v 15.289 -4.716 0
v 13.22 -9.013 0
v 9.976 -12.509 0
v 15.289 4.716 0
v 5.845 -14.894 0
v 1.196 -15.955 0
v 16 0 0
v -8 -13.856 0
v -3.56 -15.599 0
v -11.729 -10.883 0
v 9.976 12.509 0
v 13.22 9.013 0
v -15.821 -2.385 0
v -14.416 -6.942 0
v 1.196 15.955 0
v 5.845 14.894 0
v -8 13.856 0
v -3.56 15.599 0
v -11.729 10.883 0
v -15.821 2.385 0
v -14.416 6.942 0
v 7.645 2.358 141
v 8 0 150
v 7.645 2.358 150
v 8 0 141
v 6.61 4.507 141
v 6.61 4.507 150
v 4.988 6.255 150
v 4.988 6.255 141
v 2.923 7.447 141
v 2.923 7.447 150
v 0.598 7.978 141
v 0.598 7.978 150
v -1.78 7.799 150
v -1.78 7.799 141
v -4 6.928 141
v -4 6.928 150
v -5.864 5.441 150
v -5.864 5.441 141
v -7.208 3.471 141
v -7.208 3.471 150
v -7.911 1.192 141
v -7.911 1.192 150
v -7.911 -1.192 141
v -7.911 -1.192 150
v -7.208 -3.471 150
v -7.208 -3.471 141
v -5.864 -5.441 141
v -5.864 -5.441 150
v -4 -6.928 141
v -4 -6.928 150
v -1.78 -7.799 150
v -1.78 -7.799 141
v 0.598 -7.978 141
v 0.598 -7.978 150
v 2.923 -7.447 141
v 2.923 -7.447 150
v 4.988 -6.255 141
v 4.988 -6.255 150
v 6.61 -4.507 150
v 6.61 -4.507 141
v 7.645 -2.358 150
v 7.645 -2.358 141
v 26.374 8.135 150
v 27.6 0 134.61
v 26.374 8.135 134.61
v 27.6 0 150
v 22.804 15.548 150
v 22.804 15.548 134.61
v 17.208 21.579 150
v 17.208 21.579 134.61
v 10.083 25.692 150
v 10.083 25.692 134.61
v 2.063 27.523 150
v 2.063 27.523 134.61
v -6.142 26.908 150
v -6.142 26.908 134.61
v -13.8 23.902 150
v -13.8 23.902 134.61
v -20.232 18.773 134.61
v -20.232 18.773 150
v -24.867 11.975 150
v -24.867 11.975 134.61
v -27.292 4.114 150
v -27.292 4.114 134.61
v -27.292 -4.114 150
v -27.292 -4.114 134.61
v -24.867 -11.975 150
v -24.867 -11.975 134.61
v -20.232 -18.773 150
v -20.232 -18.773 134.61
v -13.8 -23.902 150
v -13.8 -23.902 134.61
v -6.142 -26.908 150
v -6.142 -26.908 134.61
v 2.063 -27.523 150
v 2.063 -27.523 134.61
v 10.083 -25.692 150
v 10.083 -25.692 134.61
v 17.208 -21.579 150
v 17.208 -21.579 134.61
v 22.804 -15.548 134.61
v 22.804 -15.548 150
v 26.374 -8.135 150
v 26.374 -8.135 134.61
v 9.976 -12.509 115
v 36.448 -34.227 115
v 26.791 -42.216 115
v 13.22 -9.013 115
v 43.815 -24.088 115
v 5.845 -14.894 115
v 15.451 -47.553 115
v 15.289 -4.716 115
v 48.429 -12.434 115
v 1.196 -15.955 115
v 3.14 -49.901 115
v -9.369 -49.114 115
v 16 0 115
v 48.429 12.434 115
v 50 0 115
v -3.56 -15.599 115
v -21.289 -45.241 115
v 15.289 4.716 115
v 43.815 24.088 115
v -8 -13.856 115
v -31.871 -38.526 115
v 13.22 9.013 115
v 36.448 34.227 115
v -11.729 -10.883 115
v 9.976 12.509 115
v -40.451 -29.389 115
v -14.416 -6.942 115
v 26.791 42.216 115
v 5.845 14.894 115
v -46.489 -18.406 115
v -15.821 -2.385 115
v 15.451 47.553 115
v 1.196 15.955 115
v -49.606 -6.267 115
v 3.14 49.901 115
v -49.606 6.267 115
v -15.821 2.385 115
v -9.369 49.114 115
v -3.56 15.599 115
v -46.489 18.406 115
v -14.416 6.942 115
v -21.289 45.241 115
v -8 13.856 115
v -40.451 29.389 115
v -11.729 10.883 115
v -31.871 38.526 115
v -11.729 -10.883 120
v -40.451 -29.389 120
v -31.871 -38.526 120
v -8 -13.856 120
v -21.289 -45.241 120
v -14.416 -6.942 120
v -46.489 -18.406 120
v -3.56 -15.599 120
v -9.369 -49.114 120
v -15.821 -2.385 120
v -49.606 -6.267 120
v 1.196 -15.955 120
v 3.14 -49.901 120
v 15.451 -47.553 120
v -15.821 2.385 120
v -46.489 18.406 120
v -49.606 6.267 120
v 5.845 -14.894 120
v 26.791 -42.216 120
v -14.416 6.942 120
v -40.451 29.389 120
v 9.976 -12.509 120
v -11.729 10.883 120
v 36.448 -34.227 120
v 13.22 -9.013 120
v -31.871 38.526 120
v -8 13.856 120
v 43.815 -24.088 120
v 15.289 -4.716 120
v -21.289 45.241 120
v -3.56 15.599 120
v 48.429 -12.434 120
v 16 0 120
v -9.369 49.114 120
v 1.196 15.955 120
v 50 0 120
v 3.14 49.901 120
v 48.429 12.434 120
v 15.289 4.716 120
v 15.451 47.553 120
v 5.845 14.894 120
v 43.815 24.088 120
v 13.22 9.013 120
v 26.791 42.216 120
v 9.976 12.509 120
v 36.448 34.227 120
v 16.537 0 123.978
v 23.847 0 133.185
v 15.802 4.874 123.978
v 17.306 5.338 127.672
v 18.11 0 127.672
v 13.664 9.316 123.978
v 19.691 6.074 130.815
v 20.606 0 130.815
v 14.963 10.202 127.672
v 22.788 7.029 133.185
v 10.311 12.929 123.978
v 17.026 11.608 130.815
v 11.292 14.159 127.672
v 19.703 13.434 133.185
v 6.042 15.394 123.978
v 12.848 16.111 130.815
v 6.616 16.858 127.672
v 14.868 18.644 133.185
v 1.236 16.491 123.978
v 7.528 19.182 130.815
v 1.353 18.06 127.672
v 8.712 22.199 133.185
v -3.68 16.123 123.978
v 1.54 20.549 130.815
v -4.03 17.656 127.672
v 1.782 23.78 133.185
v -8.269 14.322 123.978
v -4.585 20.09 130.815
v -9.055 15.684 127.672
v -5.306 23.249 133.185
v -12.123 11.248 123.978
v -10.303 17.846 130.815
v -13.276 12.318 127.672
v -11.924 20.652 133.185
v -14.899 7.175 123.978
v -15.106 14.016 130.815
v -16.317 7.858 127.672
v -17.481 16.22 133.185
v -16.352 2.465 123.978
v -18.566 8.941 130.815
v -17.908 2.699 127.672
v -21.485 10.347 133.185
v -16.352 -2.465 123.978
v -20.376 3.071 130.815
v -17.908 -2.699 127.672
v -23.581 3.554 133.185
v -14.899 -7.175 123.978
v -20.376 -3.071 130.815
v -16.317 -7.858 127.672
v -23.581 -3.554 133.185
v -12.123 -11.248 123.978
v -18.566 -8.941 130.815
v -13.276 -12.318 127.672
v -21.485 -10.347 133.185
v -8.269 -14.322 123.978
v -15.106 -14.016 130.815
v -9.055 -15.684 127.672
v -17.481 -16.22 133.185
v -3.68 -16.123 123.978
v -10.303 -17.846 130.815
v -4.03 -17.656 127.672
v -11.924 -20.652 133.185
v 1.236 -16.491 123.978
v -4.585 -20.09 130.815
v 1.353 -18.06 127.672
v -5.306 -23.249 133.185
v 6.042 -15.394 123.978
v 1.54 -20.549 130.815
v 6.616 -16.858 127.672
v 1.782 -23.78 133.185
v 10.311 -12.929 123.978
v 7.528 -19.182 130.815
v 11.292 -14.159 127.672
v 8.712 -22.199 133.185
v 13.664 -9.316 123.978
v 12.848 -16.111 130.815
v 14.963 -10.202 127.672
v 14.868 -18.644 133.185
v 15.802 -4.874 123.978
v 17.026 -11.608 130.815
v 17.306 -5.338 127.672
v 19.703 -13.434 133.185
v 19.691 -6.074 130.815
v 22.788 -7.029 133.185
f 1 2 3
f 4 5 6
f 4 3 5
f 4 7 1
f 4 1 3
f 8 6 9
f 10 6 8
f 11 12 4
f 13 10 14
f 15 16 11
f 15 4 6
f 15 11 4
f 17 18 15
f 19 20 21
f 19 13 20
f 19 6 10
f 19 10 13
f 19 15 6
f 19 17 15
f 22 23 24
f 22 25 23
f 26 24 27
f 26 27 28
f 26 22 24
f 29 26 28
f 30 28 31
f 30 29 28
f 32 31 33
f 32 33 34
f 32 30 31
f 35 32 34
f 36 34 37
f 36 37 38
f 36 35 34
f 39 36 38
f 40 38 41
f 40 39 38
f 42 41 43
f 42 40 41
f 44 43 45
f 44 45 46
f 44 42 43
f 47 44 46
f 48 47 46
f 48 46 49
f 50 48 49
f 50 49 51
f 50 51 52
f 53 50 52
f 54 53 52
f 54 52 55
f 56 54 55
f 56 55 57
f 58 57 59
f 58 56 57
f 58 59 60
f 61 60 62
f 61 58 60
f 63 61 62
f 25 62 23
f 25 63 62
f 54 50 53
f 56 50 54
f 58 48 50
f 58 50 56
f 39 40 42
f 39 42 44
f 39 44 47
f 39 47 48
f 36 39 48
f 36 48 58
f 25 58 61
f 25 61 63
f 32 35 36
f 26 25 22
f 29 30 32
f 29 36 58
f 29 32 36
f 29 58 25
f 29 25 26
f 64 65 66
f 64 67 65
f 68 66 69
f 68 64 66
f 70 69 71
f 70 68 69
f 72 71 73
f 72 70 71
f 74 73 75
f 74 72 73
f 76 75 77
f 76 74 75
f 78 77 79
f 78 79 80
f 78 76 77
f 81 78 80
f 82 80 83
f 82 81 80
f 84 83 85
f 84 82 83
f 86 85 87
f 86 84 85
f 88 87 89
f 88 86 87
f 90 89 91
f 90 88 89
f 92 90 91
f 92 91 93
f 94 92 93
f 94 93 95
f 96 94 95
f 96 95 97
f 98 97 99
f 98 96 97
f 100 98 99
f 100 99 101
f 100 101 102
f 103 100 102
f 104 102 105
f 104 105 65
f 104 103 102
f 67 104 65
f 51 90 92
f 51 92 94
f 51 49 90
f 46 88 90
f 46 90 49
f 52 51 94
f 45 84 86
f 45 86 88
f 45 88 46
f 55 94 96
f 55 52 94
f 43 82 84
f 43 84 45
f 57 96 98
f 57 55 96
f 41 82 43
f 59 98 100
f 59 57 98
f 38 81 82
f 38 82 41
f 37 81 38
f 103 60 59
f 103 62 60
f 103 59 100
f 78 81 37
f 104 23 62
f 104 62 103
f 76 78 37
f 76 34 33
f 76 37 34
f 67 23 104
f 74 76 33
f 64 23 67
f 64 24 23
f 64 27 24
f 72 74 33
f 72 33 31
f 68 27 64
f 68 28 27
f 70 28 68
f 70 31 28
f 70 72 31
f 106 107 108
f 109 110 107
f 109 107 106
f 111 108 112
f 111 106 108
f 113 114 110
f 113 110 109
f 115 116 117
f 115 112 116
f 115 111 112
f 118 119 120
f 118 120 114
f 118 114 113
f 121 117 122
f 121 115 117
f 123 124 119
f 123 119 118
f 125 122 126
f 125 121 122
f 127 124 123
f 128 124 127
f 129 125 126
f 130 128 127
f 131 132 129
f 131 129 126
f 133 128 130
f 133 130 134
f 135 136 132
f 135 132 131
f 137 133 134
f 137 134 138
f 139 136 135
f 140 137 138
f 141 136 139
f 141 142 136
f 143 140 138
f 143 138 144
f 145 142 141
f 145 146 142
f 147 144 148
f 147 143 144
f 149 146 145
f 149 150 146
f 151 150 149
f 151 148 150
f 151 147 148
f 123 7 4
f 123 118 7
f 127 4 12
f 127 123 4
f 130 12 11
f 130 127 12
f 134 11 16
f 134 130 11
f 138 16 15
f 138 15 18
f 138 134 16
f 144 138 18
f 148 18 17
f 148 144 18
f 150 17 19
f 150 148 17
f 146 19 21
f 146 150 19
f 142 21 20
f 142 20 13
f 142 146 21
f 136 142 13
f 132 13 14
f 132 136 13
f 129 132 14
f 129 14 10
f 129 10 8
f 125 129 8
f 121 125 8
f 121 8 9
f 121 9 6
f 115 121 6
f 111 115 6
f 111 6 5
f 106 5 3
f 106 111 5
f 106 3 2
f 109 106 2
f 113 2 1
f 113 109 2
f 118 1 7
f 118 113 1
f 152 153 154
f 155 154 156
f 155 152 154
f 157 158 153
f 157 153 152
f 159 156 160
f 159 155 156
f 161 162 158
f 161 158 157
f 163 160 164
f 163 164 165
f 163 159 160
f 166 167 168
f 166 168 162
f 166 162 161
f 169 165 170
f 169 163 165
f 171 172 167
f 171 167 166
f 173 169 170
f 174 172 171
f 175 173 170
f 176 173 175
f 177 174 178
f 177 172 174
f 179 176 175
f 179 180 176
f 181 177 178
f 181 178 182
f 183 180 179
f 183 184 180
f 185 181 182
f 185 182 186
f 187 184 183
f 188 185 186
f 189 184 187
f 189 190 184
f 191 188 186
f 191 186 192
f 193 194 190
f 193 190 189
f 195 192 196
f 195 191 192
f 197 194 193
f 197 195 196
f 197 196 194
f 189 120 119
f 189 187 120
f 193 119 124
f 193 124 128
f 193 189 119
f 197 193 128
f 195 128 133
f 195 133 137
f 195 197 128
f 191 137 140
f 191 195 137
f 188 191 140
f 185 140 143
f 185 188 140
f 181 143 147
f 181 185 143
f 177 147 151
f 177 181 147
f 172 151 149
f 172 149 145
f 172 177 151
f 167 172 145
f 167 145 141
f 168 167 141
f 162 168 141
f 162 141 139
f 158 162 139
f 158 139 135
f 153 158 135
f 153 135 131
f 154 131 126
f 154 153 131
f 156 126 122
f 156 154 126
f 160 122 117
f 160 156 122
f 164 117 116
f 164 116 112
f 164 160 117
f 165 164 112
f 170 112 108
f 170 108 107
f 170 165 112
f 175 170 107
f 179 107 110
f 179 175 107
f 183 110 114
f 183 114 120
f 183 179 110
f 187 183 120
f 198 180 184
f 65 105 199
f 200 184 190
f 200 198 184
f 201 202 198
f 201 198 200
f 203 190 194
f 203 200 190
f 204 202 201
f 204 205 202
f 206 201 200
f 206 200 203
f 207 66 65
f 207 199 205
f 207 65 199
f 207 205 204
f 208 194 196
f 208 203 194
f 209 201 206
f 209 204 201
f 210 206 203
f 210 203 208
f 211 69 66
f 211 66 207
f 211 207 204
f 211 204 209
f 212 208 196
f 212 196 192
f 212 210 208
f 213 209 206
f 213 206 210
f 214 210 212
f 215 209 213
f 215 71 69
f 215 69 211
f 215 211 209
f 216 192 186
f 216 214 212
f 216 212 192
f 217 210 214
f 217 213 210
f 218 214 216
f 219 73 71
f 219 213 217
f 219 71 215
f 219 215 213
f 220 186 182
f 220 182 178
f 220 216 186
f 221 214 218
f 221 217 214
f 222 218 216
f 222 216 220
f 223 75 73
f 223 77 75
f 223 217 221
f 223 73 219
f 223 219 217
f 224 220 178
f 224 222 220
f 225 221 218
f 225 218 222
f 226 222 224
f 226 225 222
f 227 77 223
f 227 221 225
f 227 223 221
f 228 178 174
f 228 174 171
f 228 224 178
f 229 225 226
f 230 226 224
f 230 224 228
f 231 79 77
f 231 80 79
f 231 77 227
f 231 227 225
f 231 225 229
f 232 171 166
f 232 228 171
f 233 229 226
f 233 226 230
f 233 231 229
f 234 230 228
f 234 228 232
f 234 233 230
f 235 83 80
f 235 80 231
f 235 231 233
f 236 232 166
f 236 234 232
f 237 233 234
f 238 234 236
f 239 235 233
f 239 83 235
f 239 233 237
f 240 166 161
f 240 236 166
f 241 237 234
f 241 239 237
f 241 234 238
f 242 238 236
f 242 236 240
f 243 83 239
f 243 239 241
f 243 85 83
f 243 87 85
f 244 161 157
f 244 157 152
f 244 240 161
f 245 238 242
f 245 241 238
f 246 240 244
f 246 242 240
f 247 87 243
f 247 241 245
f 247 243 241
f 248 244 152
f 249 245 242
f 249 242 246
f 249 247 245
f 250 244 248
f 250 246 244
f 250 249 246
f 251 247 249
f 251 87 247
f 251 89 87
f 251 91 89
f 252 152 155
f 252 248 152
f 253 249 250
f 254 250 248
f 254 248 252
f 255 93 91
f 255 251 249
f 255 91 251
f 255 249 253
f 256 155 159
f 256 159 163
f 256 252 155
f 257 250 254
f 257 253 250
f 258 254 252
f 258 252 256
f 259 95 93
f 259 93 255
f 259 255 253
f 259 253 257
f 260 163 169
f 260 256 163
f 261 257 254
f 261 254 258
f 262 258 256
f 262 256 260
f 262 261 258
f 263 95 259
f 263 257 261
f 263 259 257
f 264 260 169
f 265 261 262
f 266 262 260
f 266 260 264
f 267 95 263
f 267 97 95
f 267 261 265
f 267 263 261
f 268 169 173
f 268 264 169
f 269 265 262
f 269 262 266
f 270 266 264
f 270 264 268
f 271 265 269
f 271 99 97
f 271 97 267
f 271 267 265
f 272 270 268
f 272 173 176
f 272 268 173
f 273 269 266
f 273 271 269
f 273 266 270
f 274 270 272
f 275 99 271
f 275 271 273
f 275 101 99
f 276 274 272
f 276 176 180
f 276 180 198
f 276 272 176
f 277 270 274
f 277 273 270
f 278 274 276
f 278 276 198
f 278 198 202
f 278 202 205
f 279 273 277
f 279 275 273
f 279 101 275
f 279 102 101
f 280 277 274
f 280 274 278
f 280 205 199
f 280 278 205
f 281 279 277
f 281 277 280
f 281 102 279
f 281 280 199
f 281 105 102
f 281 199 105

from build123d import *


with BuildPart() as f1:
    # F0 (on Front) → F1 (revolve)
    with BuildSketch(Plane.XZ):
        with BuildLine():
            Line((0, 141), (0, 0))
            Line((0, 0), (16, 0))
            Line((16, 0), (16, 115))
            Line((16, 115), (50, 115))
            Line((50, 115), (50, 120))
            Line((50, 120), (16, 120))
            ThreePointArc((16, 120), (19.252662, 129.327381), (27.600006, 134.609587))
            Line((27.600006, 134.609587), (27.600006, 150))
            Line((27.600006, 150), (8, 150))
            Line((8, 150), (8, 141))
            Line((8, 141), (0, 141))
        make_face()
    revolve(axis=Axis((0, 0, 70.5), (0, 0, 1)))


solid = f1.part
